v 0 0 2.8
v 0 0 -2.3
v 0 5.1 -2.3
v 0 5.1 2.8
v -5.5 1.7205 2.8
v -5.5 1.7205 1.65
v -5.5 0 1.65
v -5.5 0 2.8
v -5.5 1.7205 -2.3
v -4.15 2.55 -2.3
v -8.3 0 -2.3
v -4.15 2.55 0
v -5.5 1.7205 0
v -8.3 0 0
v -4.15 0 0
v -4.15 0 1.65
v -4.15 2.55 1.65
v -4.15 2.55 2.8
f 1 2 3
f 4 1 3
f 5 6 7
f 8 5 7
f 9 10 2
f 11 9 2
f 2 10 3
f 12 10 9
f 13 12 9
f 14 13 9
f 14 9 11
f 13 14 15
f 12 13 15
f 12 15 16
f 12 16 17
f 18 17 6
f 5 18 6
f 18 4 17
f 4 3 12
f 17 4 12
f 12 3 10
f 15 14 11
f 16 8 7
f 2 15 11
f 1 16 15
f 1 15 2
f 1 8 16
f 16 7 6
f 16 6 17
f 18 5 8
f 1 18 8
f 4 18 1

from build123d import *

# Parameters (mm, degrees)
F1_DEPTH      = 2.3
F1_DEPTH_BACK = 2.8
F2_DEPTH      = 2.3
F3_DEPTH      = 1.65


with BuildPart() as f1:
    # F0 (on Top) → F1 (new body, two sides)
    with BuildSketch(Plane.XY) as f1_sk:
        Polygon((-4.15, 0), (0, 0), (0, 5.1), (-4.15, 2.55), align=None)
        Polygon((-5.5, 0), (-4.15, 0), (-4.15, 2.55), (-5.5, 1.7204819277), align=None)
    extrude(amount=-F1_DEPTH)
    extrude(f1_sk.sketch, amount=F1_DEPTH_BACK)

    # F0 (on Top) → F2 (join)
    with BuildSketch(Plane.XY):
        Polygon((-8.3, 0), (-5.5, 0), (-5.5, 1.7204819277), align=None)
    extrude(amount=-F2_DEPTH)

    # F0 (on Top) → F3 (cut)
    with BuildSketch(Plane.XY):
        Polygon((-5.5, 0), (-4.15, 0), (-4.15, 2.55), (-5.5, 1.7204819277), align=None)
    extrude(amount=F3_DEPTH, mode=Mode.SUBTRACT)


solid = f1.part
